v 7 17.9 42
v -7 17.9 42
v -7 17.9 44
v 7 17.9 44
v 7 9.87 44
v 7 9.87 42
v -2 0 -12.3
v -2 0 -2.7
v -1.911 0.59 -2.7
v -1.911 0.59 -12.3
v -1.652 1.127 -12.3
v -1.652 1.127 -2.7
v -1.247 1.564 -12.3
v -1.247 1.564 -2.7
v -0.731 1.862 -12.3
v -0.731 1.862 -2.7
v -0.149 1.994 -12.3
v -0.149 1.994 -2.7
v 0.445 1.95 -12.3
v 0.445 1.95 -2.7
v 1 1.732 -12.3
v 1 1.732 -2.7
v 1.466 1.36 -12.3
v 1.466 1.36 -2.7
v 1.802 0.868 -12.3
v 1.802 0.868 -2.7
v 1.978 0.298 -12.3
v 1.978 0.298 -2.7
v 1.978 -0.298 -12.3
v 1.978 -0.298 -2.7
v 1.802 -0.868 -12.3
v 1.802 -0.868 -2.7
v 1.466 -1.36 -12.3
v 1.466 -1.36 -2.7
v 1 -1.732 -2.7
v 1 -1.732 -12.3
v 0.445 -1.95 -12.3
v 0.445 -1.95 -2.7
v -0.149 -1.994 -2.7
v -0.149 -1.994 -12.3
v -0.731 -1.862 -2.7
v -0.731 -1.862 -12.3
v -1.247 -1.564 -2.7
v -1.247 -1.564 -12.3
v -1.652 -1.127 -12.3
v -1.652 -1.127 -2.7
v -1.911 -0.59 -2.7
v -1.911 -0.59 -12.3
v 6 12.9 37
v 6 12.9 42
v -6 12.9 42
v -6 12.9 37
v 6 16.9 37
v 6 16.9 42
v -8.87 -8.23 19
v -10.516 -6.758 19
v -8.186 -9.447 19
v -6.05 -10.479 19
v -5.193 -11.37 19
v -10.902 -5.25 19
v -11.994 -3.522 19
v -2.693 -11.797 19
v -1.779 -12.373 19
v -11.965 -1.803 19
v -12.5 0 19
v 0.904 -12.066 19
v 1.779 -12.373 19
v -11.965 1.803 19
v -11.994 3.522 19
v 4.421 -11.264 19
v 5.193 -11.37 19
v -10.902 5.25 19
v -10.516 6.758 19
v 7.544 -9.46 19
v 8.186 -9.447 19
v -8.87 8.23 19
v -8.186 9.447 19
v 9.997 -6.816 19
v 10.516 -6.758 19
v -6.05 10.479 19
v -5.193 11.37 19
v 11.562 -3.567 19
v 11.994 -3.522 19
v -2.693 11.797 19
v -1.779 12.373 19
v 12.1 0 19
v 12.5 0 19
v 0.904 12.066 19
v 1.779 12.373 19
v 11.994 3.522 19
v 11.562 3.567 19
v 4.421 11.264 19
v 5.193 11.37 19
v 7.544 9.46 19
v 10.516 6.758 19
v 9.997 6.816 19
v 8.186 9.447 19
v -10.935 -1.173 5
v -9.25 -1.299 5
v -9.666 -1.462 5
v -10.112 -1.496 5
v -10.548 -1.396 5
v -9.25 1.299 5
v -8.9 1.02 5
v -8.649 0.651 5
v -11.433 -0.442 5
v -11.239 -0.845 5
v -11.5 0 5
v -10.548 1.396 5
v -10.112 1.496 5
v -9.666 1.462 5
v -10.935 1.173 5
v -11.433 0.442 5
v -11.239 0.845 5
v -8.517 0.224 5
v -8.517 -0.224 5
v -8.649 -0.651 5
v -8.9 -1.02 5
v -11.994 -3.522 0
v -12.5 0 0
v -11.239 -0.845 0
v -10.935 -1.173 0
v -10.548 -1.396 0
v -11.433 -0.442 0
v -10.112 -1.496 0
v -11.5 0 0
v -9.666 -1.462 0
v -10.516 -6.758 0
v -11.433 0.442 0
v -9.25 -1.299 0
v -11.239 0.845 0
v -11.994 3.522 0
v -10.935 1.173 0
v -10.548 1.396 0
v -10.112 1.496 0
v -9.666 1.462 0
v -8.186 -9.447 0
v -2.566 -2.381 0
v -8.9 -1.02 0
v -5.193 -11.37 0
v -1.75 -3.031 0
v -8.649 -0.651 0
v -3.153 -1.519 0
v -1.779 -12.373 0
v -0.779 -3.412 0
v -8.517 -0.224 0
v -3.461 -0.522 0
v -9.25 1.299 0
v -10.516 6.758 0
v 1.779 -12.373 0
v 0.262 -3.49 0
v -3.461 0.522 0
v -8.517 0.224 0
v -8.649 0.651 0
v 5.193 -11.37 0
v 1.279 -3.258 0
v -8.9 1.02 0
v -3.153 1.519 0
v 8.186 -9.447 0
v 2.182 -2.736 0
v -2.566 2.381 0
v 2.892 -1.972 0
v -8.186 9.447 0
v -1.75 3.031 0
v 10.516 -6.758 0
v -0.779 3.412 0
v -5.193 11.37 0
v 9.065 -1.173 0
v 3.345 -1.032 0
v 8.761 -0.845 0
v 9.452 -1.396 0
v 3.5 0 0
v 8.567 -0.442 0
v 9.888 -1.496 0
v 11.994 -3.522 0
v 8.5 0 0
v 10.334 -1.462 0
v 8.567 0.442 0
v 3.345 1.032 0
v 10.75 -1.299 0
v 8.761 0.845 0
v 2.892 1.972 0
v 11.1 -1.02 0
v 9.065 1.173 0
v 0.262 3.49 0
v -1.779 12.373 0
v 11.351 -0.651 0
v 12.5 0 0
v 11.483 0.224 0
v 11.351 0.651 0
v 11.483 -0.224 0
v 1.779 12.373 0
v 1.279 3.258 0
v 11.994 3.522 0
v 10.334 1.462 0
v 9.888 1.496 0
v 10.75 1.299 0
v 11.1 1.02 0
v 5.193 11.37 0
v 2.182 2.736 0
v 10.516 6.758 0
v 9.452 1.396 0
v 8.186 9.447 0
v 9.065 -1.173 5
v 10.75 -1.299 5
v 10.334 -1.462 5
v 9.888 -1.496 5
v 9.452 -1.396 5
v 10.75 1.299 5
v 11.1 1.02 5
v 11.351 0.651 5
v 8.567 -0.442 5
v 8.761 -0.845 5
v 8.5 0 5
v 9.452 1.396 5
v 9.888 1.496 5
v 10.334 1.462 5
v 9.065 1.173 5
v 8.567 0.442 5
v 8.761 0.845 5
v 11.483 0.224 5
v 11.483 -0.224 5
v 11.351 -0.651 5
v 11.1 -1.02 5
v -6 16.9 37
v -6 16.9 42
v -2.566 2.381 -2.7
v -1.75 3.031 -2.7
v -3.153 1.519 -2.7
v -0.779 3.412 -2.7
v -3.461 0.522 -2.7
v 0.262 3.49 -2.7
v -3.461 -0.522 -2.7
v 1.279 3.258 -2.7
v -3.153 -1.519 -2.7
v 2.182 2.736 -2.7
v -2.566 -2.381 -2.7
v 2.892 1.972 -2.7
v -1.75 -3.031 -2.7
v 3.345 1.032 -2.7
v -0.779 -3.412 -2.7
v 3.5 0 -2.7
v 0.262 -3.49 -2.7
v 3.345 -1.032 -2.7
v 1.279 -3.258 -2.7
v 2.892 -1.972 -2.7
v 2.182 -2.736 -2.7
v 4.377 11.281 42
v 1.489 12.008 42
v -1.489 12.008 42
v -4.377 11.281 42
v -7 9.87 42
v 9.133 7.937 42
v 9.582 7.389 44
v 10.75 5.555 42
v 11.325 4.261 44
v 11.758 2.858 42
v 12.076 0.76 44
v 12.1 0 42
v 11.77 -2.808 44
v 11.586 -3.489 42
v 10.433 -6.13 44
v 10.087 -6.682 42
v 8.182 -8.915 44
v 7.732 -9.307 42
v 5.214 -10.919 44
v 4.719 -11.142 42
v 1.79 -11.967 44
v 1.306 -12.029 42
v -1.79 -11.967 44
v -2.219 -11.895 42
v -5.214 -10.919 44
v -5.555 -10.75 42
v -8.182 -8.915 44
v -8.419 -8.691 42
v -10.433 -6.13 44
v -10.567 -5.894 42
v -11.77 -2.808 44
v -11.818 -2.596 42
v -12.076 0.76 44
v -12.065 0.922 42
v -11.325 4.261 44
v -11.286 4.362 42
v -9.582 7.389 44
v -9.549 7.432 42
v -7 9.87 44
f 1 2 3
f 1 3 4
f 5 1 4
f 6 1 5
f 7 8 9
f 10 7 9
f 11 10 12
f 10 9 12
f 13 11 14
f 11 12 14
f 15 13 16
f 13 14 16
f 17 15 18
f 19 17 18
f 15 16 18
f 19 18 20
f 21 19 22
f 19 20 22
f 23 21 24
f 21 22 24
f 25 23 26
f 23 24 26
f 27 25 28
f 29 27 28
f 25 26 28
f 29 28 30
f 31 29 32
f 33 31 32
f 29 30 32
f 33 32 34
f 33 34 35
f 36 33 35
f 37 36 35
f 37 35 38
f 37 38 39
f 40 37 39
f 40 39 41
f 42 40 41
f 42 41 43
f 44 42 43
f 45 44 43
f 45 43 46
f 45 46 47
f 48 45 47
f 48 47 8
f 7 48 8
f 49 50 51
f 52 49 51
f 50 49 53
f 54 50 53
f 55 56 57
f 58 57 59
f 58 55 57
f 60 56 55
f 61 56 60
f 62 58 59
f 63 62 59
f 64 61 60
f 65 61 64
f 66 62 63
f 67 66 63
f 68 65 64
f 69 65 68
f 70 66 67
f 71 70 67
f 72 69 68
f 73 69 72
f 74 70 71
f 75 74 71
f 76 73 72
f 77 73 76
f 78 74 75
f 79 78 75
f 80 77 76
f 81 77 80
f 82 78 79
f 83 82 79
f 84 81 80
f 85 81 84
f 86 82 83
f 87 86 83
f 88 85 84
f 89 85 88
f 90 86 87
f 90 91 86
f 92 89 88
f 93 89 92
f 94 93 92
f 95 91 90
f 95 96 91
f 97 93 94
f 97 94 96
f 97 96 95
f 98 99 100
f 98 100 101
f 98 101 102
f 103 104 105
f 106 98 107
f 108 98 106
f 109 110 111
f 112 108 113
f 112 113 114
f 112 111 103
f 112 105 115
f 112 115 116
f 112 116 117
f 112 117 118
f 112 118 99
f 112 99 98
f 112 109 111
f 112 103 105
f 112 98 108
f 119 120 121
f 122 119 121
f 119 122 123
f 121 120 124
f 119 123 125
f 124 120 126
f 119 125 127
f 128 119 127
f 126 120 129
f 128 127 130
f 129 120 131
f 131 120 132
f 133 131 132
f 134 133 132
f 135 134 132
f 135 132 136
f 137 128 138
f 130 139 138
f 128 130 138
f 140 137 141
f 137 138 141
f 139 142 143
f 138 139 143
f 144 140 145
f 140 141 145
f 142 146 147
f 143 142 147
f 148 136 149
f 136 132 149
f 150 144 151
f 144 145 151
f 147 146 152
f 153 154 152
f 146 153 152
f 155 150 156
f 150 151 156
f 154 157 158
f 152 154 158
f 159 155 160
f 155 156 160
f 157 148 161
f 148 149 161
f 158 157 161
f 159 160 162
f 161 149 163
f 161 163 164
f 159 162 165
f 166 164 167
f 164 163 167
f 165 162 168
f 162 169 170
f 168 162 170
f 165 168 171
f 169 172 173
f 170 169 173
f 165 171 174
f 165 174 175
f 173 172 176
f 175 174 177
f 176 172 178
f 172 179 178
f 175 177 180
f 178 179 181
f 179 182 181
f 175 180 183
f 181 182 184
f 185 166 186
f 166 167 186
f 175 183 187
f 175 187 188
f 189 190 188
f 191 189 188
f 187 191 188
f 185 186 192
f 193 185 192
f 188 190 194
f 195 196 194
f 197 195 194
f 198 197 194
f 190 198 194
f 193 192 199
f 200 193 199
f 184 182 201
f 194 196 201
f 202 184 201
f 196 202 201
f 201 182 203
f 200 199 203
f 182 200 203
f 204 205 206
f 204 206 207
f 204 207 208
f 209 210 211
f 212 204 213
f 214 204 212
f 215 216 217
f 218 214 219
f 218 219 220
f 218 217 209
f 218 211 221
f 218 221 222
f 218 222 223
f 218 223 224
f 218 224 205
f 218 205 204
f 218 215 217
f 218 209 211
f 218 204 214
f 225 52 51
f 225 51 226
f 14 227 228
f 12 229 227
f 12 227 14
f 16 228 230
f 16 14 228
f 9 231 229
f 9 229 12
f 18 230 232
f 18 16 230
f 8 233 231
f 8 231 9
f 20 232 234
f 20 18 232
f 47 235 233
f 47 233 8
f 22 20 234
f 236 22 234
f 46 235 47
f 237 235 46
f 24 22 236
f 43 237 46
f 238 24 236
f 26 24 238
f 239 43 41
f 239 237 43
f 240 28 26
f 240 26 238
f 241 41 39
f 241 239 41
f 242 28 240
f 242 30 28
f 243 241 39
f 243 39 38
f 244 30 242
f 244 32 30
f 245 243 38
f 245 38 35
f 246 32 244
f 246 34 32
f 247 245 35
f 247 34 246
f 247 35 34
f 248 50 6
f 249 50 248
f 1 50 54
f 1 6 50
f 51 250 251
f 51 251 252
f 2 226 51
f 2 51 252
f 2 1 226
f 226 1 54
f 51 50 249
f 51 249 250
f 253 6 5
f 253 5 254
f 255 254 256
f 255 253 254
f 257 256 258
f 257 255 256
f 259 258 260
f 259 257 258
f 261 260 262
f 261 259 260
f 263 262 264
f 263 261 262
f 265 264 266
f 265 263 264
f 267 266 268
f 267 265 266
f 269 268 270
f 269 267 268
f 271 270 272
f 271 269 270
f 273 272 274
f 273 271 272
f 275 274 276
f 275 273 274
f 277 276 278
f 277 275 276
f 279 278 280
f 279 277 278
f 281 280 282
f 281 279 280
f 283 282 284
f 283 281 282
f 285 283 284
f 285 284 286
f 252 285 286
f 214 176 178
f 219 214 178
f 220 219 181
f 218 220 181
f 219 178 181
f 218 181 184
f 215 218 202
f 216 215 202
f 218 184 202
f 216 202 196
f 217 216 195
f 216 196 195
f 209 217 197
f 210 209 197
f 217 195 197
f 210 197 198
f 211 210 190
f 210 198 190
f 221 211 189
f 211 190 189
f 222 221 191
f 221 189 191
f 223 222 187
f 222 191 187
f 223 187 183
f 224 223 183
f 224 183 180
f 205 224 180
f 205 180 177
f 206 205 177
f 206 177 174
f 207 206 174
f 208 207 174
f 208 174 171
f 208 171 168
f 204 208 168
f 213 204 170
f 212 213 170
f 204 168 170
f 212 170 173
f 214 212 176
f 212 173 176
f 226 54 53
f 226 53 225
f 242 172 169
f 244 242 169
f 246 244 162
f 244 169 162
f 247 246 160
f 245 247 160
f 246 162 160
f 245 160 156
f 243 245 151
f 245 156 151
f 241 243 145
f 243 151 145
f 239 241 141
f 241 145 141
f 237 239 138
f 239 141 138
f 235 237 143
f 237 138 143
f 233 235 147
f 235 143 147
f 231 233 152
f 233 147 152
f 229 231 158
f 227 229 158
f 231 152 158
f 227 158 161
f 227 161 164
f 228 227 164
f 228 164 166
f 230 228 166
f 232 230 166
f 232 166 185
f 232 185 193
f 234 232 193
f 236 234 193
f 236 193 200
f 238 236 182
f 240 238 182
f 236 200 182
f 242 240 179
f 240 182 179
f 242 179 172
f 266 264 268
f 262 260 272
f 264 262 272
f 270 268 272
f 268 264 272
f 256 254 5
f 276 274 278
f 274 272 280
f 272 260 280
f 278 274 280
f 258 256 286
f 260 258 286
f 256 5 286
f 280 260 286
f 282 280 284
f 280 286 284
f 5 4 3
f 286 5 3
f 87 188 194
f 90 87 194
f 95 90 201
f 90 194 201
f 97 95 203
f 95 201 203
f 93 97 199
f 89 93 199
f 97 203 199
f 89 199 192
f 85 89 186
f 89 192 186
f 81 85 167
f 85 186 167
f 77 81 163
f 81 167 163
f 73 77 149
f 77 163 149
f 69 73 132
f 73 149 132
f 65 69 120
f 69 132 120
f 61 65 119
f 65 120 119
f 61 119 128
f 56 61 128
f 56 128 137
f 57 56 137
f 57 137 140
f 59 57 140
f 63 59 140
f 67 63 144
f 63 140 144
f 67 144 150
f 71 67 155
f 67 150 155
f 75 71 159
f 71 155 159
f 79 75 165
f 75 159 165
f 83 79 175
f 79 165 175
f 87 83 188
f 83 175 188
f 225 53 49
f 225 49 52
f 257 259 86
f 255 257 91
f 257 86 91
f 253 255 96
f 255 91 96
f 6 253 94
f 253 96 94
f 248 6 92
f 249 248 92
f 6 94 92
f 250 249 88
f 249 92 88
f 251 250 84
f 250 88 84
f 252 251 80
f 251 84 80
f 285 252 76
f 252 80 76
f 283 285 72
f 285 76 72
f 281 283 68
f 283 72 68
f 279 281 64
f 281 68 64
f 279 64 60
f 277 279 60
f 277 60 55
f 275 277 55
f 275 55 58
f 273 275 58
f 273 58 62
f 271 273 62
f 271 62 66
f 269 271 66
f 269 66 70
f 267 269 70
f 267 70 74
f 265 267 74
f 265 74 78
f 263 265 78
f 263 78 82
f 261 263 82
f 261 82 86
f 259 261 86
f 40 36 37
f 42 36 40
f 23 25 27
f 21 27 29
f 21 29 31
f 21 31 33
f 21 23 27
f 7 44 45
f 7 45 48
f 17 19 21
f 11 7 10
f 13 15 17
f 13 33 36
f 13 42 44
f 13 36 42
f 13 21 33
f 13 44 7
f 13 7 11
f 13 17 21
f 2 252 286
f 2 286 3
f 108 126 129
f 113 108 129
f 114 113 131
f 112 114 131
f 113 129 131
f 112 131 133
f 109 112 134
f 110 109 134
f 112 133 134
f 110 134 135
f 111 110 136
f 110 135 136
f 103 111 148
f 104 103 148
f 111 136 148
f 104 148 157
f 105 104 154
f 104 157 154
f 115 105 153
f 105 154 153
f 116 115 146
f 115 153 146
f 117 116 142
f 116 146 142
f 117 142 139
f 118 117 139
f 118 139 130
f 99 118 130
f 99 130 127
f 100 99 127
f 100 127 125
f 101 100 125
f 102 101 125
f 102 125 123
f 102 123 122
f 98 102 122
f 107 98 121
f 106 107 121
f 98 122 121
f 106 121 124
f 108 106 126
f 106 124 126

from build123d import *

# Parameters (mm, degrees)
SKETCH1_R           = 12.5
BOSS_EXTRUDE1_DEPTH = 19
SKETCH2_R           = 12.1
BOSS_EXTRUDE2_DEPTH = 23
BOSS_EXTRUDE3_DEPTH = 2
SKETCH4_W           = 12
SKETCH4_H           = 4
BOSS_EXTRUDE4_DEPTH = 5
SKETCH5_R           = 3.5
BOSS_EXTRUDE5_DEPTH = 2.7
SKETCH6_R           = 2
BOSS_EXTRUDE6_DEPTH = 12.3
SKETCH7_R           = 1.5
CUT_EXTRUDE1_DEPTH  = 5


with BuildPart() as part:
    # Sketch1 → Boss-Extrude1 (new body)
    with BuildSketch(Plane.XY):
        Circle(SKETCH1_R)
    extrude(amount=BOSS_EXTRUDE1_DEPTH)

    # Sketch2 → Boss-Extrude2 (add)
    with BuildSketch(Plane.XY.offset(19)):
        Circle(SKETCH2_R)
    extrude(amount=BOSS_EXTRUDE2_DEPTH)

    # Sketch3 → Boss-Extrude3 (add)
    with BuildSketch(Plane.XY.offset(42)):
        with BuildLine():
            Line((-7, 17.9), (7, 17.9))
            Line((7, 17.9), (7, 9.86965045))
            ThreePointArc((7, 9.86965045), (0, -12.1), (-7, 9.86965045))
            Line((-7, 9.86965045), (-7, 17.9))
        make_face()
    extrude(amount=BOSS_EXTRUDE3_DEPTH)

    # Sketch4 → Boss-Extrude4 (add)
    with BuildSketch(Plane(origin=(0, 0, 42), x_dir=(-1, 0, 0), z_dir=(0, 0, -1))):
        with Locations((0, 14.9)):
            Rectangle(SKETCH4_W, SKETCH4_H)
    extrude(amount=BOSS_EXTRUDE4_DEPTH)

    # Sketch5 → Boss-Extrude5 (add)
    with BuildSketch(Plane(origin=(0, 0, 0), x_dir=(-1, 0, 0), z_dir=(0, 0, -1))):
        with Locations(Location((0, 0, 0), (0, 0, 180))):
            Circle(SKETCH5_R)
    extrude(amount=BOSS_EXTRUDE5_DEPTH)

    # Sketch6 → Boss-Extrude6 (add)
    with BuildSketch(Plane(origin=(0, 0, 0), x_dir=(-1, 0, 0), z_dir=(0, 0, -1))):
        Circle(SKETCH6_R)
    extrude(amount=BOSS_EXTRUDE6_DEPTH)

    # Sketch7 → Cut-Extrude1 (cut)
    with BuildSketch(Plane(origin=(0, 0, 0), x_dir=(-1, 0, 0), z_dir=(0, 0, -1))):
        with Locations((10, 0)):
            Circle(SKETCH7_R)
        with Locations((-10, 0)):
            Circle(SKETCH7_R)
    extrude(amount=-CUT_EXTRUDE1_DEPTH, mode=Mode.SUBTRACT)


solid = part.part
